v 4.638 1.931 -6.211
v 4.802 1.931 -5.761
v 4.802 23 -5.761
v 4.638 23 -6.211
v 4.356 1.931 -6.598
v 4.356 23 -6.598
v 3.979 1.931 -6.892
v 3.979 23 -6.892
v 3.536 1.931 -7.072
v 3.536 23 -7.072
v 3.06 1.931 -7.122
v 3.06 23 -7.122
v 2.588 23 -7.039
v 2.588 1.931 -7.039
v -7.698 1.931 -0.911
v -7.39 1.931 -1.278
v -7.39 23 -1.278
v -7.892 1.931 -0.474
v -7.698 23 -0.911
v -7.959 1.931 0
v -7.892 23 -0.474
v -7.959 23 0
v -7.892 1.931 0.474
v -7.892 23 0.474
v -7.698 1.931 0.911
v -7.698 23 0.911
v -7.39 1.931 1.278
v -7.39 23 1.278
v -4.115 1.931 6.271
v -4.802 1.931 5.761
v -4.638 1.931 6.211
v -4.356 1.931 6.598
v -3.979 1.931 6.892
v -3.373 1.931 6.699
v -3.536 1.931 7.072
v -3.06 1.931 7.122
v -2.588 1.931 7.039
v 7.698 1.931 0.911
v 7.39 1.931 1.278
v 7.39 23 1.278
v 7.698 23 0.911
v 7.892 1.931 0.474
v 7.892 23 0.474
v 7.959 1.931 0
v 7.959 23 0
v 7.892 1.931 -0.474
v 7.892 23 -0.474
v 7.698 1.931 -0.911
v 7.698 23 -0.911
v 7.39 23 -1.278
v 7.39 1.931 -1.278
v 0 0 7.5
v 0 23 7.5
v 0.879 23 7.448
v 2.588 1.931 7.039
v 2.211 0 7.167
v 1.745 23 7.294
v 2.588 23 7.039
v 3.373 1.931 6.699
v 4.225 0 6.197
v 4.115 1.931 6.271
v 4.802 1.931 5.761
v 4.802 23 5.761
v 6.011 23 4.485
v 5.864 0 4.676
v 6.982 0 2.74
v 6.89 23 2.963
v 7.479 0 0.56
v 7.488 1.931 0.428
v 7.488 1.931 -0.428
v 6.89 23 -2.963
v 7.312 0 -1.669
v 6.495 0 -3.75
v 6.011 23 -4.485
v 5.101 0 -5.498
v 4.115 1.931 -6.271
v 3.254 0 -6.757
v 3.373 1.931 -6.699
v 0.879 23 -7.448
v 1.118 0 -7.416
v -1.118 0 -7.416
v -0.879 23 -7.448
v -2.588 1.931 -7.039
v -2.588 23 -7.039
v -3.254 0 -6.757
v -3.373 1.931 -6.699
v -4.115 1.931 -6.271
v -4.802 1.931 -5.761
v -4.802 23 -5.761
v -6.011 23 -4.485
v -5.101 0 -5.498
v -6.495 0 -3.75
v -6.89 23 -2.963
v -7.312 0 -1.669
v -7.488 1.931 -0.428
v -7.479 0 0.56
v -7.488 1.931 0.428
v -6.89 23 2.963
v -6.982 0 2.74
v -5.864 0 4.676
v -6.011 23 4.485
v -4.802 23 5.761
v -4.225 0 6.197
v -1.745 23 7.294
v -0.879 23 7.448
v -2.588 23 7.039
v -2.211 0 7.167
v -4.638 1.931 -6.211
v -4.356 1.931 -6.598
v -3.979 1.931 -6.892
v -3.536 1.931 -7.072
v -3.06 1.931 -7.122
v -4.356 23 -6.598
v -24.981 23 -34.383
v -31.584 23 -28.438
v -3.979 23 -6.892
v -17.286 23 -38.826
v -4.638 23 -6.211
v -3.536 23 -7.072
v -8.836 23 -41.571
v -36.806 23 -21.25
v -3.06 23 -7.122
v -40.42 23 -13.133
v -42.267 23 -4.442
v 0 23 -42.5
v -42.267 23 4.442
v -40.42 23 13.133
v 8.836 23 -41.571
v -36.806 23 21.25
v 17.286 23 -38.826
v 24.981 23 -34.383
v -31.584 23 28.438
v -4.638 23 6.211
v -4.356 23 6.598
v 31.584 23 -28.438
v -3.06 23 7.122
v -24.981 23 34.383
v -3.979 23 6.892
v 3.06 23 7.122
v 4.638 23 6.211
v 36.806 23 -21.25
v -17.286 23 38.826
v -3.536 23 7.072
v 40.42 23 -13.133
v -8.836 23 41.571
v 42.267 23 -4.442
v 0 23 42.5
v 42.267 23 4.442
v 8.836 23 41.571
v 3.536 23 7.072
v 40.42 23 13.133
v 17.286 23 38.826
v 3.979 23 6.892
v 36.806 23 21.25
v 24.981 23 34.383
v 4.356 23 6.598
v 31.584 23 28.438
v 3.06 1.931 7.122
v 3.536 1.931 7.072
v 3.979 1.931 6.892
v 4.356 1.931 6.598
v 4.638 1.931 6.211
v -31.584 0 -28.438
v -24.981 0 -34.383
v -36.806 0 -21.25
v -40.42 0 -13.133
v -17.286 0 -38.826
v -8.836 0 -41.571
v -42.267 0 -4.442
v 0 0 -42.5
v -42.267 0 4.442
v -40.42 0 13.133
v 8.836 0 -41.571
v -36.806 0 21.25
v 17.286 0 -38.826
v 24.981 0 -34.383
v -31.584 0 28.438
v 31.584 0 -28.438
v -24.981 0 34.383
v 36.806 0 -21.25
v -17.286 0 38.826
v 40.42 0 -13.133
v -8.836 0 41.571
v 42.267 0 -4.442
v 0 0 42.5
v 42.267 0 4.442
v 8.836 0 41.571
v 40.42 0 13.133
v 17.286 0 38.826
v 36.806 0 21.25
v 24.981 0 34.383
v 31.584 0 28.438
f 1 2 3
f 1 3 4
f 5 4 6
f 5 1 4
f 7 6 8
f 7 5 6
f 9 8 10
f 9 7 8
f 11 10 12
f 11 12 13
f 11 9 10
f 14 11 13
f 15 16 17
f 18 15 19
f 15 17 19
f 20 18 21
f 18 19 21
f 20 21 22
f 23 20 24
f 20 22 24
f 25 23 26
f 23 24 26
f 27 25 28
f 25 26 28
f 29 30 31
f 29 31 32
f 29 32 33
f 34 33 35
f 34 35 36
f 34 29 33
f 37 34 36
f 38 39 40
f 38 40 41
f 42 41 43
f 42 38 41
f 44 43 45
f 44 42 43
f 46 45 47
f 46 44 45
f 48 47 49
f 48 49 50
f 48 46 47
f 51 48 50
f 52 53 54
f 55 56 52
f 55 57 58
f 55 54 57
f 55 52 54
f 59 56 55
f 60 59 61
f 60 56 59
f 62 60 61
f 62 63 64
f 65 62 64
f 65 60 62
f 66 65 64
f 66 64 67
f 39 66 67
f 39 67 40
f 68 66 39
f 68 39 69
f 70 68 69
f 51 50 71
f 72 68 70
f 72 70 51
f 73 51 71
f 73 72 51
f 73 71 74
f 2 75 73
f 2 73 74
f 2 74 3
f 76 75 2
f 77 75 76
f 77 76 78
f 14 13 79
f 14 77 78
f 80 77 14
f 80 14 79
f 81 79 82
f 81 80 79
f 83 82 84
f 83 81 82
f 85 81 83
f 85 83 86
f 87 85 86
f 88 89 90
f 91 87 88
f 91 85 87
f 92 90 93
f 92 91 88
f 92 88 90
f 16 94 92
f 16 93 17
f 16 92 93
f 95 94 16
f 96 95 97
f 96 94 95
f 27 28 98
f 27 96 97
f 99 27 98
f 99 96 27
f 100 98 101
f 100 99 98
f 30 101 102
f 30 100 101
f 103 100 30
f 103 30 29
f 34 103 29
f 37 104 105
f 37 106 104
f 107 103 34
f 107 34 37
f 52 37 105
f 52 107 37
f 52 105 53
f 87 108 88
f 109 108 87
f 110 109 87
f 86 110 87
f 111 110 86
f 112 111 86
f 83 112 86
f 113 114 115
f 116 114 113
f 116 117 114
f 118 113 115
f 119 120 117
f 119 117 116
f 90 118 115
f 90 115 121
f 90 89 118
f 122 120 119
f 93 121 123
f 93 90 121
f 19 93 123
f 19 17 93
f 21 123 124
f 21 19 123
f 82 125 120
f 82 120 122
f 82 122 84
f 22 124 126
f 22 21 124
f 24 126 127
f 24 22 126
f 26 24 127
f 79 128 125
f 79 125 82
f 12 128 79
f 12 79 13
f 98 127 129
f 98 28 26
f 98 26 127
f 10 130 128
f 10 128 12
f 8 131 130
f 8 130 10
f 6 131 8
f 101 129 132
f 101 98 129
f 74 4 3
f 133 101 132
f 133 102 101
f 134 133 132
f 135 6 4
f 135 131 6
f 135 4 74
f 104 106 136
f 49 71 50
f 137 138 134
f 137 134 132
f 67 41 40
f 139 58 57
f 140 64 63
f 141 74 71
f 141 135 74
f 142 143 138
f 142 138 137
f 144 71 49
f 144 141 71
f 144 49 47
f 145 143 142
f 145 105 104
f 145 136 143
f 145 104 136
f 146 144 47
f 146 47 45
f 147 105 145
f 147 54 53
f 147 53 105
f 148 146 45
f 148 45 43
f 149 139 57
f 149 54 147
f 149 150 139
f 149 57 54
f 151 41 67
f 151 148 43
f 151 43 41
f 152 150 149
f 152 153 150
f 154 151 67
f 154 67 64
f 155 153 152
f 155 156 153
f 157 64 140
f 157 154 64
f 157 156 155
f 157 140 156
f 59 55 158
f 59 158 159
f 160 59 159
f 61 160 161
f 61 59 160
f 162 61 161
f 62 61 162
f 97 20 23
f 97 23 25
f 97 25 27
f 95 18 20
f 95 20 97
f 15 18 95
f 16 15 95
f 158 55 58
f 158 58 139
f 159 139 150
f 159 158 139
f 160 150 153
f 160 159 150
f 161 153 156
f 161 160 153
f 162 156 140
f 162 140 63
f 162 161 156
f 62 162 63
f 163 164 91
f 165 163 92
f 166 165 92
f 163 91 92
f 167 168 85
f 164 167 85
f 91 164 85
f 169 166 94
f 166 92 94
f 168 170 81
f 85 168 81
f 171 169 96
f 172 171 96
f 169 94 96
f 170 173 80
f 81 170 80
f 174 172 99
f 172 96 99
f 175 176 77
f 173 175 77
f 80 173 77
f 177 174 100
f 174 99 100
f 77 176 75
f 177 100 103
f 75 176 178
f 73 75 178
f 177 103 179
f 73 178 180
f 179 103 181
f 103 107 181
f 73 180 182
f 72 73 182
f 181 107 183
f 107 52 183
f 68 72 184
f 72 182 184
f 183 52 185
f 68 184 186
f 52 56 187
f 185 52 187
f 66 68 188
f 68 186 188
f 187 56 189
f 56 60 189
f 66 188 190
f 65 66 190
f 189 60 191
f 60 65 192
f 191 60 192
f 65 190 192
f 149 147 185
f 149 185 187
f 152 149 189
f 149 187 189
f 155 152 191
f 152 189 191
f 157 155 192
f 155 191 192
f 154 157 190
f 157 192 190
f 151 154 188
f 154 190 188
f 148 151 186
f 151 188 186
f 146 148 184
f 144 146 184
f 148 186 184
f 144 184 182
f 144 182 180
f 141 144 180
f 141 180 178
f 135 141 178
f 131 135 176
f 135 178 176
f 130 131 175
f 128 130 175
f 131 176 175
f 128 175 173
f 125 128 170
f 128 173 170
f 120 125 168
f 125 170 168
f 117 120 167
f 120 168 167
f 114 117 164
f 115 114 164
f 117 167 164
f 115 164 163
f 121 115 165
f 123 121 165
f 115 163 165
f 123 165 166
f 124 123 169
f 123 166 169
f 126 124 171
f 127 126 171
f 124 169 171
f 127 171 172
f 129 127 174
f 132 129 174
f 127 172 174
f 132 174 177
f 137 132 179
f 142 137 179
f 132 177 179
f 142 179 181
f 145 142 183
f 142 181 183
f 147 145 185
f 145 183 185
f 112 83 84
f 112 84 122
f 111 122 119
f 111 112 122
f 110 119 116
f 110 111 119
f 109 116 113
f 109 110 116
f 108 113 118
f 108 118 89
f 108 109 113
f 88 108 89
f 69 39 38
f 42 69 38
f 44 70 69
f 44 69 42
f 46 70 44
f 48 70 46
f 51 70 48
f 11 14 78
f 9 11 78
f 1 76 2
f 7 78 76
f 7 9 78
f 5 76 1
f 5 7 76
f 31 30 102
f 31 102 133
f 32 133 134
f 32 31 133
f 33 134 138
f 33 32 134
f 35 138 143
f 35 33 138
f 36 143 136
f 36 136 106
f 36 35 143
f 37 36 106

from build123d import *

# Parameters (mm, degrees)
SKETCH1_R           = 42.5
BOSS_EXTRUDE1_DEPTH = 23
SKETCH2_R           = 7.5
CUT_EXTRUDE1_DEPTH  = 65.354487023
SKETCH3_R           = 1.721944662
CUT_EXTRUDE2_DEPTH  = 21.06869199
CIRPATTERN1_COUNT   = 6


with BuildPart() as part:
    # Sketch1 → Boss-Extrude1 (new body)
    with BuildSketch(Plane(origin=(0, 0, 0), x_dir=(1, 0, 0), z_dir=(0, 1, 0))):
        Circle(SKETCH1_R)
    extrude(amount=BOSS_EXTRUDE1_DEPTH)

    # Sketch2 → Cut-Extrude1 (cut, through all)
    with BuildSketch(Plane(origin=(0, 0, 0), x_dir=(1, 0, 0), z_dir=(0, 1, 0))):
        Circle(SKETCH2_R)
    extrude(amount=CUT_EXTRUDE1_DEPTH, mode=Mode.SUBTRACT)

    # Sketch3 → Cut-Extrude2 (cut)
    with BuildSketch(Plane(origin=(0, 23, 0), x_dir=(1, 0, 0), z_dir=(0, 1, 0))):
        with Locations((-6.236582965, 0)):
            Circle(SKETCH3_R)
    cut_extrude2 = extrude(amount=-CUT_EXTRUDE2_DEPTH, mode=Mode.SUBTRACT)

    # CirPattern1: Cut-Extrude2 ×6 about axis
    cirpattern1_axis = Axis((0, 0, 0), (0, 1, 0))
    for i in range(1, CIRPATTERN1_COUNT):
        add(cut_extrude2.rotate(cirpattern1_axis, i * 360 / CIRPATTERN1_COUNT), mode=Mode.SUBTRACT)


solid = part.part
